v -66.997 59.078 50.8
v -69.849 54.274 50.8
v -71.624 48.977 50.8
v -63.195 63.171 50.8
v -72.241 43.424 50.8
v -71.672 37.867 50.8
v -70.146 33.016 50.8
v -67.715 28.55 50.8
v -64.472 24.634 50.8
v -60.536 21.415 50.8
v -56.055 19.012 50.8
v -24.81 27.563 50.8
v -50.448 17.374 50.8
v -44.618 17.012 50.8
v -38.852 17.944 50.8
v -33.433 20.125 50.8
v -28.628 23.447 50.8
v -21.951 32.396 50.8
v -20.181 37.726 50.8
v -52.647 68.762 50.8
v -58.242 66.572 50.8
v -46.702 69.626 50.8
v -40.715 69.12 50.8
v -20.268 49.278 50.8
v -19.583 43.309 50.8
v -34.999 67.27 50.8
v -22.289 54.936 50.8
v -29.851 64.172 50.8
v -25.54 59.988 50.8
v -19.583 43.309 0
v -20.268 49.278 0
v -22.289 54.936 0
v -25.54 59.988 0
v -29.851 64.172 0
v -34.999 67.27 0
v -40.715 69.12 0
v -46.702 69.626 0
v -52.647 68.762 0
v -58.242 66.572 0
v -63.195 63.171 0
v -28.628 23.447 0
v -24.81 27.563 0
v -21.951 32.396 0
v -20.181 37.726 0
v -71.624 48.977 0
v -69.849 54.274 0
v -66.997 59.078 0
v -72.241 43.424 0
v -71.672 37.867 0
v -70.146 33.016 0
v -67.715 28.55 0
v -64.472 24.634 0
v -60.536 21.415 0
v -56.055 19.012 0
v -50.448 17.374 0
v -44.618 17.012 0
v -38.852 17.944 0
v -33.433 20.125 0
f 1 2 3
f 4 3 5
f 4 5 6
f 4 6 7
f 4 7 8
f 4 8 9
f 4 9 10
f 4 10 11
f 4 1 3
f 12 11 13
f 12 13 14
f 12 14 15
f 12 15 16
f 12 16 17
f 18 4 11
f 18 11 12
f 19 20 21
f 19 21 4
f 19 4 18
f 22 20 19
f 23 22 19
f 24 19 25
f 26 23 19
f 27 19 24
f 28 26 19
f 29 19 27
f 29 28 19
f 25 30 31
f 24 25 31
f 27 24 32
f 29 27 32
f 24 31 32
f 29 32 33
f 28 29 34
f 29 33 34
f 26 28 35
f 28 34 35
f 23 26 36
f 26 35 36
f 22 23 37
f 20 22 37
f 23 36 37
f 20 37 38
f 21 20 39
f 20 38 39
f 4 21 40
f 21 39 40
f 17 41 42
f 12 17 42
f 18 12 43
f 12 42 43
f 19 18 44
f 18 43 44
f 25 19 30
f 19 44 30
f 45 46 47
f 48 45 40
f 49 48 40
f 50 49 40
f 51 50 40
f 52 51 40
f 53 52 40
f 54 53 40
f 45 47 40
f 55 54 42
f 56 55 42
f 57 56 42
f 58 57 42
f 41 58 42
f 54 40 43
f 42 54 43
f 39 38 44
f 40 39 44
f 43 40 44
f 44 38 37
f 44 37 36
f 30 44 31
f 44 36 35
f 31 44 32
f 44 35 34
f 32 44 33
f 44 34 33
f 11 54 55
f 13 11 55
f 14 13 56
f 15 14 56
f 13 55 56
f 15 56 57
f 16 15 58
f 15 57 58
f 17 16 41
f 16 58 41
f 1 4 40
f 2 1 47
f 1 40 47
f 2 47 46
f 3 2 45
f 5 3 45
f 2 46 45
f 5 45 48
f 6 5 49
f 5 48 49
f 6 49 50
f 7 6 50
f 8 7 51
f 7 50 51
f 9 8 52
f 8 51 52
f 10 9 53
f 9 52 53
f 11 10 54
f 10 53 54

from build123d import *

# Parameters (mm, degrees)
F1_DEPTH = 50.8


with BuildPart() as f1:
    # F0 (on Top) → F1 (new body)
    with BuildSketch(Plane.XY):
        with BuildLine():
            ThreePointArc((-28.628483, 23.446609), (-21.950553, 32.396332), (-19.582599, 43.308942))
            ThreePointArc((-19.582599, 43.308942), (-34.999107, 67.270107), (-63.194952, 63.171275))
            Line((-63.194952, 63.171275), (-54.316911, 52.968404))
            Line((-54.316911, 52.968404), (-52.872185, 51.308089))
            Line((-52.872185, 51.308089), (-38.250614, 34.504607))
            Line((-38.250614, 34.504607), (-28.628483, 23.446609))
        make_face()
        with BuildLine():
            Line((-54.316911, 52.968404), (-71.672229, 37.866652))
            ThreePointArc((-71.672229, 37.866652), (-66.188404, 26.513751), (-56.054994, 19.012103))
            Line((-56.054994, 19.012103), (-38.250614, 34.504607))
            Line((-38.250614, 34.504607), (-52.872185, 51.308089))
            Line((-52.872185, 51.308089), (-54.316911, 52.968404))
        make_face()
        with BuildLine():
            Line((-54.316911, 52.968404), (-63.194952, 63.171275))
            ThreePointArc((-63.194952, 63.171275), (-70.877134, 51.672582), (-71.672229, 37.866652))
            Line((-71.672229, 37.866652), (-54.316911, 52.968404))
        make_face()
        with BuildLine():
            ThreePointArc((-56.054994, 19.012103), (-41.709223, 17.317376), (-28.628483, 23.446609))
            Line((-28.628483, 23.446609), (-38.250614, 34.504607))
            Line((-38.250614, 34.504607), (-56.054994, 19.012103))
        make_face()
    extrude(amount=F1_DEPTH)


solid = f1.part
